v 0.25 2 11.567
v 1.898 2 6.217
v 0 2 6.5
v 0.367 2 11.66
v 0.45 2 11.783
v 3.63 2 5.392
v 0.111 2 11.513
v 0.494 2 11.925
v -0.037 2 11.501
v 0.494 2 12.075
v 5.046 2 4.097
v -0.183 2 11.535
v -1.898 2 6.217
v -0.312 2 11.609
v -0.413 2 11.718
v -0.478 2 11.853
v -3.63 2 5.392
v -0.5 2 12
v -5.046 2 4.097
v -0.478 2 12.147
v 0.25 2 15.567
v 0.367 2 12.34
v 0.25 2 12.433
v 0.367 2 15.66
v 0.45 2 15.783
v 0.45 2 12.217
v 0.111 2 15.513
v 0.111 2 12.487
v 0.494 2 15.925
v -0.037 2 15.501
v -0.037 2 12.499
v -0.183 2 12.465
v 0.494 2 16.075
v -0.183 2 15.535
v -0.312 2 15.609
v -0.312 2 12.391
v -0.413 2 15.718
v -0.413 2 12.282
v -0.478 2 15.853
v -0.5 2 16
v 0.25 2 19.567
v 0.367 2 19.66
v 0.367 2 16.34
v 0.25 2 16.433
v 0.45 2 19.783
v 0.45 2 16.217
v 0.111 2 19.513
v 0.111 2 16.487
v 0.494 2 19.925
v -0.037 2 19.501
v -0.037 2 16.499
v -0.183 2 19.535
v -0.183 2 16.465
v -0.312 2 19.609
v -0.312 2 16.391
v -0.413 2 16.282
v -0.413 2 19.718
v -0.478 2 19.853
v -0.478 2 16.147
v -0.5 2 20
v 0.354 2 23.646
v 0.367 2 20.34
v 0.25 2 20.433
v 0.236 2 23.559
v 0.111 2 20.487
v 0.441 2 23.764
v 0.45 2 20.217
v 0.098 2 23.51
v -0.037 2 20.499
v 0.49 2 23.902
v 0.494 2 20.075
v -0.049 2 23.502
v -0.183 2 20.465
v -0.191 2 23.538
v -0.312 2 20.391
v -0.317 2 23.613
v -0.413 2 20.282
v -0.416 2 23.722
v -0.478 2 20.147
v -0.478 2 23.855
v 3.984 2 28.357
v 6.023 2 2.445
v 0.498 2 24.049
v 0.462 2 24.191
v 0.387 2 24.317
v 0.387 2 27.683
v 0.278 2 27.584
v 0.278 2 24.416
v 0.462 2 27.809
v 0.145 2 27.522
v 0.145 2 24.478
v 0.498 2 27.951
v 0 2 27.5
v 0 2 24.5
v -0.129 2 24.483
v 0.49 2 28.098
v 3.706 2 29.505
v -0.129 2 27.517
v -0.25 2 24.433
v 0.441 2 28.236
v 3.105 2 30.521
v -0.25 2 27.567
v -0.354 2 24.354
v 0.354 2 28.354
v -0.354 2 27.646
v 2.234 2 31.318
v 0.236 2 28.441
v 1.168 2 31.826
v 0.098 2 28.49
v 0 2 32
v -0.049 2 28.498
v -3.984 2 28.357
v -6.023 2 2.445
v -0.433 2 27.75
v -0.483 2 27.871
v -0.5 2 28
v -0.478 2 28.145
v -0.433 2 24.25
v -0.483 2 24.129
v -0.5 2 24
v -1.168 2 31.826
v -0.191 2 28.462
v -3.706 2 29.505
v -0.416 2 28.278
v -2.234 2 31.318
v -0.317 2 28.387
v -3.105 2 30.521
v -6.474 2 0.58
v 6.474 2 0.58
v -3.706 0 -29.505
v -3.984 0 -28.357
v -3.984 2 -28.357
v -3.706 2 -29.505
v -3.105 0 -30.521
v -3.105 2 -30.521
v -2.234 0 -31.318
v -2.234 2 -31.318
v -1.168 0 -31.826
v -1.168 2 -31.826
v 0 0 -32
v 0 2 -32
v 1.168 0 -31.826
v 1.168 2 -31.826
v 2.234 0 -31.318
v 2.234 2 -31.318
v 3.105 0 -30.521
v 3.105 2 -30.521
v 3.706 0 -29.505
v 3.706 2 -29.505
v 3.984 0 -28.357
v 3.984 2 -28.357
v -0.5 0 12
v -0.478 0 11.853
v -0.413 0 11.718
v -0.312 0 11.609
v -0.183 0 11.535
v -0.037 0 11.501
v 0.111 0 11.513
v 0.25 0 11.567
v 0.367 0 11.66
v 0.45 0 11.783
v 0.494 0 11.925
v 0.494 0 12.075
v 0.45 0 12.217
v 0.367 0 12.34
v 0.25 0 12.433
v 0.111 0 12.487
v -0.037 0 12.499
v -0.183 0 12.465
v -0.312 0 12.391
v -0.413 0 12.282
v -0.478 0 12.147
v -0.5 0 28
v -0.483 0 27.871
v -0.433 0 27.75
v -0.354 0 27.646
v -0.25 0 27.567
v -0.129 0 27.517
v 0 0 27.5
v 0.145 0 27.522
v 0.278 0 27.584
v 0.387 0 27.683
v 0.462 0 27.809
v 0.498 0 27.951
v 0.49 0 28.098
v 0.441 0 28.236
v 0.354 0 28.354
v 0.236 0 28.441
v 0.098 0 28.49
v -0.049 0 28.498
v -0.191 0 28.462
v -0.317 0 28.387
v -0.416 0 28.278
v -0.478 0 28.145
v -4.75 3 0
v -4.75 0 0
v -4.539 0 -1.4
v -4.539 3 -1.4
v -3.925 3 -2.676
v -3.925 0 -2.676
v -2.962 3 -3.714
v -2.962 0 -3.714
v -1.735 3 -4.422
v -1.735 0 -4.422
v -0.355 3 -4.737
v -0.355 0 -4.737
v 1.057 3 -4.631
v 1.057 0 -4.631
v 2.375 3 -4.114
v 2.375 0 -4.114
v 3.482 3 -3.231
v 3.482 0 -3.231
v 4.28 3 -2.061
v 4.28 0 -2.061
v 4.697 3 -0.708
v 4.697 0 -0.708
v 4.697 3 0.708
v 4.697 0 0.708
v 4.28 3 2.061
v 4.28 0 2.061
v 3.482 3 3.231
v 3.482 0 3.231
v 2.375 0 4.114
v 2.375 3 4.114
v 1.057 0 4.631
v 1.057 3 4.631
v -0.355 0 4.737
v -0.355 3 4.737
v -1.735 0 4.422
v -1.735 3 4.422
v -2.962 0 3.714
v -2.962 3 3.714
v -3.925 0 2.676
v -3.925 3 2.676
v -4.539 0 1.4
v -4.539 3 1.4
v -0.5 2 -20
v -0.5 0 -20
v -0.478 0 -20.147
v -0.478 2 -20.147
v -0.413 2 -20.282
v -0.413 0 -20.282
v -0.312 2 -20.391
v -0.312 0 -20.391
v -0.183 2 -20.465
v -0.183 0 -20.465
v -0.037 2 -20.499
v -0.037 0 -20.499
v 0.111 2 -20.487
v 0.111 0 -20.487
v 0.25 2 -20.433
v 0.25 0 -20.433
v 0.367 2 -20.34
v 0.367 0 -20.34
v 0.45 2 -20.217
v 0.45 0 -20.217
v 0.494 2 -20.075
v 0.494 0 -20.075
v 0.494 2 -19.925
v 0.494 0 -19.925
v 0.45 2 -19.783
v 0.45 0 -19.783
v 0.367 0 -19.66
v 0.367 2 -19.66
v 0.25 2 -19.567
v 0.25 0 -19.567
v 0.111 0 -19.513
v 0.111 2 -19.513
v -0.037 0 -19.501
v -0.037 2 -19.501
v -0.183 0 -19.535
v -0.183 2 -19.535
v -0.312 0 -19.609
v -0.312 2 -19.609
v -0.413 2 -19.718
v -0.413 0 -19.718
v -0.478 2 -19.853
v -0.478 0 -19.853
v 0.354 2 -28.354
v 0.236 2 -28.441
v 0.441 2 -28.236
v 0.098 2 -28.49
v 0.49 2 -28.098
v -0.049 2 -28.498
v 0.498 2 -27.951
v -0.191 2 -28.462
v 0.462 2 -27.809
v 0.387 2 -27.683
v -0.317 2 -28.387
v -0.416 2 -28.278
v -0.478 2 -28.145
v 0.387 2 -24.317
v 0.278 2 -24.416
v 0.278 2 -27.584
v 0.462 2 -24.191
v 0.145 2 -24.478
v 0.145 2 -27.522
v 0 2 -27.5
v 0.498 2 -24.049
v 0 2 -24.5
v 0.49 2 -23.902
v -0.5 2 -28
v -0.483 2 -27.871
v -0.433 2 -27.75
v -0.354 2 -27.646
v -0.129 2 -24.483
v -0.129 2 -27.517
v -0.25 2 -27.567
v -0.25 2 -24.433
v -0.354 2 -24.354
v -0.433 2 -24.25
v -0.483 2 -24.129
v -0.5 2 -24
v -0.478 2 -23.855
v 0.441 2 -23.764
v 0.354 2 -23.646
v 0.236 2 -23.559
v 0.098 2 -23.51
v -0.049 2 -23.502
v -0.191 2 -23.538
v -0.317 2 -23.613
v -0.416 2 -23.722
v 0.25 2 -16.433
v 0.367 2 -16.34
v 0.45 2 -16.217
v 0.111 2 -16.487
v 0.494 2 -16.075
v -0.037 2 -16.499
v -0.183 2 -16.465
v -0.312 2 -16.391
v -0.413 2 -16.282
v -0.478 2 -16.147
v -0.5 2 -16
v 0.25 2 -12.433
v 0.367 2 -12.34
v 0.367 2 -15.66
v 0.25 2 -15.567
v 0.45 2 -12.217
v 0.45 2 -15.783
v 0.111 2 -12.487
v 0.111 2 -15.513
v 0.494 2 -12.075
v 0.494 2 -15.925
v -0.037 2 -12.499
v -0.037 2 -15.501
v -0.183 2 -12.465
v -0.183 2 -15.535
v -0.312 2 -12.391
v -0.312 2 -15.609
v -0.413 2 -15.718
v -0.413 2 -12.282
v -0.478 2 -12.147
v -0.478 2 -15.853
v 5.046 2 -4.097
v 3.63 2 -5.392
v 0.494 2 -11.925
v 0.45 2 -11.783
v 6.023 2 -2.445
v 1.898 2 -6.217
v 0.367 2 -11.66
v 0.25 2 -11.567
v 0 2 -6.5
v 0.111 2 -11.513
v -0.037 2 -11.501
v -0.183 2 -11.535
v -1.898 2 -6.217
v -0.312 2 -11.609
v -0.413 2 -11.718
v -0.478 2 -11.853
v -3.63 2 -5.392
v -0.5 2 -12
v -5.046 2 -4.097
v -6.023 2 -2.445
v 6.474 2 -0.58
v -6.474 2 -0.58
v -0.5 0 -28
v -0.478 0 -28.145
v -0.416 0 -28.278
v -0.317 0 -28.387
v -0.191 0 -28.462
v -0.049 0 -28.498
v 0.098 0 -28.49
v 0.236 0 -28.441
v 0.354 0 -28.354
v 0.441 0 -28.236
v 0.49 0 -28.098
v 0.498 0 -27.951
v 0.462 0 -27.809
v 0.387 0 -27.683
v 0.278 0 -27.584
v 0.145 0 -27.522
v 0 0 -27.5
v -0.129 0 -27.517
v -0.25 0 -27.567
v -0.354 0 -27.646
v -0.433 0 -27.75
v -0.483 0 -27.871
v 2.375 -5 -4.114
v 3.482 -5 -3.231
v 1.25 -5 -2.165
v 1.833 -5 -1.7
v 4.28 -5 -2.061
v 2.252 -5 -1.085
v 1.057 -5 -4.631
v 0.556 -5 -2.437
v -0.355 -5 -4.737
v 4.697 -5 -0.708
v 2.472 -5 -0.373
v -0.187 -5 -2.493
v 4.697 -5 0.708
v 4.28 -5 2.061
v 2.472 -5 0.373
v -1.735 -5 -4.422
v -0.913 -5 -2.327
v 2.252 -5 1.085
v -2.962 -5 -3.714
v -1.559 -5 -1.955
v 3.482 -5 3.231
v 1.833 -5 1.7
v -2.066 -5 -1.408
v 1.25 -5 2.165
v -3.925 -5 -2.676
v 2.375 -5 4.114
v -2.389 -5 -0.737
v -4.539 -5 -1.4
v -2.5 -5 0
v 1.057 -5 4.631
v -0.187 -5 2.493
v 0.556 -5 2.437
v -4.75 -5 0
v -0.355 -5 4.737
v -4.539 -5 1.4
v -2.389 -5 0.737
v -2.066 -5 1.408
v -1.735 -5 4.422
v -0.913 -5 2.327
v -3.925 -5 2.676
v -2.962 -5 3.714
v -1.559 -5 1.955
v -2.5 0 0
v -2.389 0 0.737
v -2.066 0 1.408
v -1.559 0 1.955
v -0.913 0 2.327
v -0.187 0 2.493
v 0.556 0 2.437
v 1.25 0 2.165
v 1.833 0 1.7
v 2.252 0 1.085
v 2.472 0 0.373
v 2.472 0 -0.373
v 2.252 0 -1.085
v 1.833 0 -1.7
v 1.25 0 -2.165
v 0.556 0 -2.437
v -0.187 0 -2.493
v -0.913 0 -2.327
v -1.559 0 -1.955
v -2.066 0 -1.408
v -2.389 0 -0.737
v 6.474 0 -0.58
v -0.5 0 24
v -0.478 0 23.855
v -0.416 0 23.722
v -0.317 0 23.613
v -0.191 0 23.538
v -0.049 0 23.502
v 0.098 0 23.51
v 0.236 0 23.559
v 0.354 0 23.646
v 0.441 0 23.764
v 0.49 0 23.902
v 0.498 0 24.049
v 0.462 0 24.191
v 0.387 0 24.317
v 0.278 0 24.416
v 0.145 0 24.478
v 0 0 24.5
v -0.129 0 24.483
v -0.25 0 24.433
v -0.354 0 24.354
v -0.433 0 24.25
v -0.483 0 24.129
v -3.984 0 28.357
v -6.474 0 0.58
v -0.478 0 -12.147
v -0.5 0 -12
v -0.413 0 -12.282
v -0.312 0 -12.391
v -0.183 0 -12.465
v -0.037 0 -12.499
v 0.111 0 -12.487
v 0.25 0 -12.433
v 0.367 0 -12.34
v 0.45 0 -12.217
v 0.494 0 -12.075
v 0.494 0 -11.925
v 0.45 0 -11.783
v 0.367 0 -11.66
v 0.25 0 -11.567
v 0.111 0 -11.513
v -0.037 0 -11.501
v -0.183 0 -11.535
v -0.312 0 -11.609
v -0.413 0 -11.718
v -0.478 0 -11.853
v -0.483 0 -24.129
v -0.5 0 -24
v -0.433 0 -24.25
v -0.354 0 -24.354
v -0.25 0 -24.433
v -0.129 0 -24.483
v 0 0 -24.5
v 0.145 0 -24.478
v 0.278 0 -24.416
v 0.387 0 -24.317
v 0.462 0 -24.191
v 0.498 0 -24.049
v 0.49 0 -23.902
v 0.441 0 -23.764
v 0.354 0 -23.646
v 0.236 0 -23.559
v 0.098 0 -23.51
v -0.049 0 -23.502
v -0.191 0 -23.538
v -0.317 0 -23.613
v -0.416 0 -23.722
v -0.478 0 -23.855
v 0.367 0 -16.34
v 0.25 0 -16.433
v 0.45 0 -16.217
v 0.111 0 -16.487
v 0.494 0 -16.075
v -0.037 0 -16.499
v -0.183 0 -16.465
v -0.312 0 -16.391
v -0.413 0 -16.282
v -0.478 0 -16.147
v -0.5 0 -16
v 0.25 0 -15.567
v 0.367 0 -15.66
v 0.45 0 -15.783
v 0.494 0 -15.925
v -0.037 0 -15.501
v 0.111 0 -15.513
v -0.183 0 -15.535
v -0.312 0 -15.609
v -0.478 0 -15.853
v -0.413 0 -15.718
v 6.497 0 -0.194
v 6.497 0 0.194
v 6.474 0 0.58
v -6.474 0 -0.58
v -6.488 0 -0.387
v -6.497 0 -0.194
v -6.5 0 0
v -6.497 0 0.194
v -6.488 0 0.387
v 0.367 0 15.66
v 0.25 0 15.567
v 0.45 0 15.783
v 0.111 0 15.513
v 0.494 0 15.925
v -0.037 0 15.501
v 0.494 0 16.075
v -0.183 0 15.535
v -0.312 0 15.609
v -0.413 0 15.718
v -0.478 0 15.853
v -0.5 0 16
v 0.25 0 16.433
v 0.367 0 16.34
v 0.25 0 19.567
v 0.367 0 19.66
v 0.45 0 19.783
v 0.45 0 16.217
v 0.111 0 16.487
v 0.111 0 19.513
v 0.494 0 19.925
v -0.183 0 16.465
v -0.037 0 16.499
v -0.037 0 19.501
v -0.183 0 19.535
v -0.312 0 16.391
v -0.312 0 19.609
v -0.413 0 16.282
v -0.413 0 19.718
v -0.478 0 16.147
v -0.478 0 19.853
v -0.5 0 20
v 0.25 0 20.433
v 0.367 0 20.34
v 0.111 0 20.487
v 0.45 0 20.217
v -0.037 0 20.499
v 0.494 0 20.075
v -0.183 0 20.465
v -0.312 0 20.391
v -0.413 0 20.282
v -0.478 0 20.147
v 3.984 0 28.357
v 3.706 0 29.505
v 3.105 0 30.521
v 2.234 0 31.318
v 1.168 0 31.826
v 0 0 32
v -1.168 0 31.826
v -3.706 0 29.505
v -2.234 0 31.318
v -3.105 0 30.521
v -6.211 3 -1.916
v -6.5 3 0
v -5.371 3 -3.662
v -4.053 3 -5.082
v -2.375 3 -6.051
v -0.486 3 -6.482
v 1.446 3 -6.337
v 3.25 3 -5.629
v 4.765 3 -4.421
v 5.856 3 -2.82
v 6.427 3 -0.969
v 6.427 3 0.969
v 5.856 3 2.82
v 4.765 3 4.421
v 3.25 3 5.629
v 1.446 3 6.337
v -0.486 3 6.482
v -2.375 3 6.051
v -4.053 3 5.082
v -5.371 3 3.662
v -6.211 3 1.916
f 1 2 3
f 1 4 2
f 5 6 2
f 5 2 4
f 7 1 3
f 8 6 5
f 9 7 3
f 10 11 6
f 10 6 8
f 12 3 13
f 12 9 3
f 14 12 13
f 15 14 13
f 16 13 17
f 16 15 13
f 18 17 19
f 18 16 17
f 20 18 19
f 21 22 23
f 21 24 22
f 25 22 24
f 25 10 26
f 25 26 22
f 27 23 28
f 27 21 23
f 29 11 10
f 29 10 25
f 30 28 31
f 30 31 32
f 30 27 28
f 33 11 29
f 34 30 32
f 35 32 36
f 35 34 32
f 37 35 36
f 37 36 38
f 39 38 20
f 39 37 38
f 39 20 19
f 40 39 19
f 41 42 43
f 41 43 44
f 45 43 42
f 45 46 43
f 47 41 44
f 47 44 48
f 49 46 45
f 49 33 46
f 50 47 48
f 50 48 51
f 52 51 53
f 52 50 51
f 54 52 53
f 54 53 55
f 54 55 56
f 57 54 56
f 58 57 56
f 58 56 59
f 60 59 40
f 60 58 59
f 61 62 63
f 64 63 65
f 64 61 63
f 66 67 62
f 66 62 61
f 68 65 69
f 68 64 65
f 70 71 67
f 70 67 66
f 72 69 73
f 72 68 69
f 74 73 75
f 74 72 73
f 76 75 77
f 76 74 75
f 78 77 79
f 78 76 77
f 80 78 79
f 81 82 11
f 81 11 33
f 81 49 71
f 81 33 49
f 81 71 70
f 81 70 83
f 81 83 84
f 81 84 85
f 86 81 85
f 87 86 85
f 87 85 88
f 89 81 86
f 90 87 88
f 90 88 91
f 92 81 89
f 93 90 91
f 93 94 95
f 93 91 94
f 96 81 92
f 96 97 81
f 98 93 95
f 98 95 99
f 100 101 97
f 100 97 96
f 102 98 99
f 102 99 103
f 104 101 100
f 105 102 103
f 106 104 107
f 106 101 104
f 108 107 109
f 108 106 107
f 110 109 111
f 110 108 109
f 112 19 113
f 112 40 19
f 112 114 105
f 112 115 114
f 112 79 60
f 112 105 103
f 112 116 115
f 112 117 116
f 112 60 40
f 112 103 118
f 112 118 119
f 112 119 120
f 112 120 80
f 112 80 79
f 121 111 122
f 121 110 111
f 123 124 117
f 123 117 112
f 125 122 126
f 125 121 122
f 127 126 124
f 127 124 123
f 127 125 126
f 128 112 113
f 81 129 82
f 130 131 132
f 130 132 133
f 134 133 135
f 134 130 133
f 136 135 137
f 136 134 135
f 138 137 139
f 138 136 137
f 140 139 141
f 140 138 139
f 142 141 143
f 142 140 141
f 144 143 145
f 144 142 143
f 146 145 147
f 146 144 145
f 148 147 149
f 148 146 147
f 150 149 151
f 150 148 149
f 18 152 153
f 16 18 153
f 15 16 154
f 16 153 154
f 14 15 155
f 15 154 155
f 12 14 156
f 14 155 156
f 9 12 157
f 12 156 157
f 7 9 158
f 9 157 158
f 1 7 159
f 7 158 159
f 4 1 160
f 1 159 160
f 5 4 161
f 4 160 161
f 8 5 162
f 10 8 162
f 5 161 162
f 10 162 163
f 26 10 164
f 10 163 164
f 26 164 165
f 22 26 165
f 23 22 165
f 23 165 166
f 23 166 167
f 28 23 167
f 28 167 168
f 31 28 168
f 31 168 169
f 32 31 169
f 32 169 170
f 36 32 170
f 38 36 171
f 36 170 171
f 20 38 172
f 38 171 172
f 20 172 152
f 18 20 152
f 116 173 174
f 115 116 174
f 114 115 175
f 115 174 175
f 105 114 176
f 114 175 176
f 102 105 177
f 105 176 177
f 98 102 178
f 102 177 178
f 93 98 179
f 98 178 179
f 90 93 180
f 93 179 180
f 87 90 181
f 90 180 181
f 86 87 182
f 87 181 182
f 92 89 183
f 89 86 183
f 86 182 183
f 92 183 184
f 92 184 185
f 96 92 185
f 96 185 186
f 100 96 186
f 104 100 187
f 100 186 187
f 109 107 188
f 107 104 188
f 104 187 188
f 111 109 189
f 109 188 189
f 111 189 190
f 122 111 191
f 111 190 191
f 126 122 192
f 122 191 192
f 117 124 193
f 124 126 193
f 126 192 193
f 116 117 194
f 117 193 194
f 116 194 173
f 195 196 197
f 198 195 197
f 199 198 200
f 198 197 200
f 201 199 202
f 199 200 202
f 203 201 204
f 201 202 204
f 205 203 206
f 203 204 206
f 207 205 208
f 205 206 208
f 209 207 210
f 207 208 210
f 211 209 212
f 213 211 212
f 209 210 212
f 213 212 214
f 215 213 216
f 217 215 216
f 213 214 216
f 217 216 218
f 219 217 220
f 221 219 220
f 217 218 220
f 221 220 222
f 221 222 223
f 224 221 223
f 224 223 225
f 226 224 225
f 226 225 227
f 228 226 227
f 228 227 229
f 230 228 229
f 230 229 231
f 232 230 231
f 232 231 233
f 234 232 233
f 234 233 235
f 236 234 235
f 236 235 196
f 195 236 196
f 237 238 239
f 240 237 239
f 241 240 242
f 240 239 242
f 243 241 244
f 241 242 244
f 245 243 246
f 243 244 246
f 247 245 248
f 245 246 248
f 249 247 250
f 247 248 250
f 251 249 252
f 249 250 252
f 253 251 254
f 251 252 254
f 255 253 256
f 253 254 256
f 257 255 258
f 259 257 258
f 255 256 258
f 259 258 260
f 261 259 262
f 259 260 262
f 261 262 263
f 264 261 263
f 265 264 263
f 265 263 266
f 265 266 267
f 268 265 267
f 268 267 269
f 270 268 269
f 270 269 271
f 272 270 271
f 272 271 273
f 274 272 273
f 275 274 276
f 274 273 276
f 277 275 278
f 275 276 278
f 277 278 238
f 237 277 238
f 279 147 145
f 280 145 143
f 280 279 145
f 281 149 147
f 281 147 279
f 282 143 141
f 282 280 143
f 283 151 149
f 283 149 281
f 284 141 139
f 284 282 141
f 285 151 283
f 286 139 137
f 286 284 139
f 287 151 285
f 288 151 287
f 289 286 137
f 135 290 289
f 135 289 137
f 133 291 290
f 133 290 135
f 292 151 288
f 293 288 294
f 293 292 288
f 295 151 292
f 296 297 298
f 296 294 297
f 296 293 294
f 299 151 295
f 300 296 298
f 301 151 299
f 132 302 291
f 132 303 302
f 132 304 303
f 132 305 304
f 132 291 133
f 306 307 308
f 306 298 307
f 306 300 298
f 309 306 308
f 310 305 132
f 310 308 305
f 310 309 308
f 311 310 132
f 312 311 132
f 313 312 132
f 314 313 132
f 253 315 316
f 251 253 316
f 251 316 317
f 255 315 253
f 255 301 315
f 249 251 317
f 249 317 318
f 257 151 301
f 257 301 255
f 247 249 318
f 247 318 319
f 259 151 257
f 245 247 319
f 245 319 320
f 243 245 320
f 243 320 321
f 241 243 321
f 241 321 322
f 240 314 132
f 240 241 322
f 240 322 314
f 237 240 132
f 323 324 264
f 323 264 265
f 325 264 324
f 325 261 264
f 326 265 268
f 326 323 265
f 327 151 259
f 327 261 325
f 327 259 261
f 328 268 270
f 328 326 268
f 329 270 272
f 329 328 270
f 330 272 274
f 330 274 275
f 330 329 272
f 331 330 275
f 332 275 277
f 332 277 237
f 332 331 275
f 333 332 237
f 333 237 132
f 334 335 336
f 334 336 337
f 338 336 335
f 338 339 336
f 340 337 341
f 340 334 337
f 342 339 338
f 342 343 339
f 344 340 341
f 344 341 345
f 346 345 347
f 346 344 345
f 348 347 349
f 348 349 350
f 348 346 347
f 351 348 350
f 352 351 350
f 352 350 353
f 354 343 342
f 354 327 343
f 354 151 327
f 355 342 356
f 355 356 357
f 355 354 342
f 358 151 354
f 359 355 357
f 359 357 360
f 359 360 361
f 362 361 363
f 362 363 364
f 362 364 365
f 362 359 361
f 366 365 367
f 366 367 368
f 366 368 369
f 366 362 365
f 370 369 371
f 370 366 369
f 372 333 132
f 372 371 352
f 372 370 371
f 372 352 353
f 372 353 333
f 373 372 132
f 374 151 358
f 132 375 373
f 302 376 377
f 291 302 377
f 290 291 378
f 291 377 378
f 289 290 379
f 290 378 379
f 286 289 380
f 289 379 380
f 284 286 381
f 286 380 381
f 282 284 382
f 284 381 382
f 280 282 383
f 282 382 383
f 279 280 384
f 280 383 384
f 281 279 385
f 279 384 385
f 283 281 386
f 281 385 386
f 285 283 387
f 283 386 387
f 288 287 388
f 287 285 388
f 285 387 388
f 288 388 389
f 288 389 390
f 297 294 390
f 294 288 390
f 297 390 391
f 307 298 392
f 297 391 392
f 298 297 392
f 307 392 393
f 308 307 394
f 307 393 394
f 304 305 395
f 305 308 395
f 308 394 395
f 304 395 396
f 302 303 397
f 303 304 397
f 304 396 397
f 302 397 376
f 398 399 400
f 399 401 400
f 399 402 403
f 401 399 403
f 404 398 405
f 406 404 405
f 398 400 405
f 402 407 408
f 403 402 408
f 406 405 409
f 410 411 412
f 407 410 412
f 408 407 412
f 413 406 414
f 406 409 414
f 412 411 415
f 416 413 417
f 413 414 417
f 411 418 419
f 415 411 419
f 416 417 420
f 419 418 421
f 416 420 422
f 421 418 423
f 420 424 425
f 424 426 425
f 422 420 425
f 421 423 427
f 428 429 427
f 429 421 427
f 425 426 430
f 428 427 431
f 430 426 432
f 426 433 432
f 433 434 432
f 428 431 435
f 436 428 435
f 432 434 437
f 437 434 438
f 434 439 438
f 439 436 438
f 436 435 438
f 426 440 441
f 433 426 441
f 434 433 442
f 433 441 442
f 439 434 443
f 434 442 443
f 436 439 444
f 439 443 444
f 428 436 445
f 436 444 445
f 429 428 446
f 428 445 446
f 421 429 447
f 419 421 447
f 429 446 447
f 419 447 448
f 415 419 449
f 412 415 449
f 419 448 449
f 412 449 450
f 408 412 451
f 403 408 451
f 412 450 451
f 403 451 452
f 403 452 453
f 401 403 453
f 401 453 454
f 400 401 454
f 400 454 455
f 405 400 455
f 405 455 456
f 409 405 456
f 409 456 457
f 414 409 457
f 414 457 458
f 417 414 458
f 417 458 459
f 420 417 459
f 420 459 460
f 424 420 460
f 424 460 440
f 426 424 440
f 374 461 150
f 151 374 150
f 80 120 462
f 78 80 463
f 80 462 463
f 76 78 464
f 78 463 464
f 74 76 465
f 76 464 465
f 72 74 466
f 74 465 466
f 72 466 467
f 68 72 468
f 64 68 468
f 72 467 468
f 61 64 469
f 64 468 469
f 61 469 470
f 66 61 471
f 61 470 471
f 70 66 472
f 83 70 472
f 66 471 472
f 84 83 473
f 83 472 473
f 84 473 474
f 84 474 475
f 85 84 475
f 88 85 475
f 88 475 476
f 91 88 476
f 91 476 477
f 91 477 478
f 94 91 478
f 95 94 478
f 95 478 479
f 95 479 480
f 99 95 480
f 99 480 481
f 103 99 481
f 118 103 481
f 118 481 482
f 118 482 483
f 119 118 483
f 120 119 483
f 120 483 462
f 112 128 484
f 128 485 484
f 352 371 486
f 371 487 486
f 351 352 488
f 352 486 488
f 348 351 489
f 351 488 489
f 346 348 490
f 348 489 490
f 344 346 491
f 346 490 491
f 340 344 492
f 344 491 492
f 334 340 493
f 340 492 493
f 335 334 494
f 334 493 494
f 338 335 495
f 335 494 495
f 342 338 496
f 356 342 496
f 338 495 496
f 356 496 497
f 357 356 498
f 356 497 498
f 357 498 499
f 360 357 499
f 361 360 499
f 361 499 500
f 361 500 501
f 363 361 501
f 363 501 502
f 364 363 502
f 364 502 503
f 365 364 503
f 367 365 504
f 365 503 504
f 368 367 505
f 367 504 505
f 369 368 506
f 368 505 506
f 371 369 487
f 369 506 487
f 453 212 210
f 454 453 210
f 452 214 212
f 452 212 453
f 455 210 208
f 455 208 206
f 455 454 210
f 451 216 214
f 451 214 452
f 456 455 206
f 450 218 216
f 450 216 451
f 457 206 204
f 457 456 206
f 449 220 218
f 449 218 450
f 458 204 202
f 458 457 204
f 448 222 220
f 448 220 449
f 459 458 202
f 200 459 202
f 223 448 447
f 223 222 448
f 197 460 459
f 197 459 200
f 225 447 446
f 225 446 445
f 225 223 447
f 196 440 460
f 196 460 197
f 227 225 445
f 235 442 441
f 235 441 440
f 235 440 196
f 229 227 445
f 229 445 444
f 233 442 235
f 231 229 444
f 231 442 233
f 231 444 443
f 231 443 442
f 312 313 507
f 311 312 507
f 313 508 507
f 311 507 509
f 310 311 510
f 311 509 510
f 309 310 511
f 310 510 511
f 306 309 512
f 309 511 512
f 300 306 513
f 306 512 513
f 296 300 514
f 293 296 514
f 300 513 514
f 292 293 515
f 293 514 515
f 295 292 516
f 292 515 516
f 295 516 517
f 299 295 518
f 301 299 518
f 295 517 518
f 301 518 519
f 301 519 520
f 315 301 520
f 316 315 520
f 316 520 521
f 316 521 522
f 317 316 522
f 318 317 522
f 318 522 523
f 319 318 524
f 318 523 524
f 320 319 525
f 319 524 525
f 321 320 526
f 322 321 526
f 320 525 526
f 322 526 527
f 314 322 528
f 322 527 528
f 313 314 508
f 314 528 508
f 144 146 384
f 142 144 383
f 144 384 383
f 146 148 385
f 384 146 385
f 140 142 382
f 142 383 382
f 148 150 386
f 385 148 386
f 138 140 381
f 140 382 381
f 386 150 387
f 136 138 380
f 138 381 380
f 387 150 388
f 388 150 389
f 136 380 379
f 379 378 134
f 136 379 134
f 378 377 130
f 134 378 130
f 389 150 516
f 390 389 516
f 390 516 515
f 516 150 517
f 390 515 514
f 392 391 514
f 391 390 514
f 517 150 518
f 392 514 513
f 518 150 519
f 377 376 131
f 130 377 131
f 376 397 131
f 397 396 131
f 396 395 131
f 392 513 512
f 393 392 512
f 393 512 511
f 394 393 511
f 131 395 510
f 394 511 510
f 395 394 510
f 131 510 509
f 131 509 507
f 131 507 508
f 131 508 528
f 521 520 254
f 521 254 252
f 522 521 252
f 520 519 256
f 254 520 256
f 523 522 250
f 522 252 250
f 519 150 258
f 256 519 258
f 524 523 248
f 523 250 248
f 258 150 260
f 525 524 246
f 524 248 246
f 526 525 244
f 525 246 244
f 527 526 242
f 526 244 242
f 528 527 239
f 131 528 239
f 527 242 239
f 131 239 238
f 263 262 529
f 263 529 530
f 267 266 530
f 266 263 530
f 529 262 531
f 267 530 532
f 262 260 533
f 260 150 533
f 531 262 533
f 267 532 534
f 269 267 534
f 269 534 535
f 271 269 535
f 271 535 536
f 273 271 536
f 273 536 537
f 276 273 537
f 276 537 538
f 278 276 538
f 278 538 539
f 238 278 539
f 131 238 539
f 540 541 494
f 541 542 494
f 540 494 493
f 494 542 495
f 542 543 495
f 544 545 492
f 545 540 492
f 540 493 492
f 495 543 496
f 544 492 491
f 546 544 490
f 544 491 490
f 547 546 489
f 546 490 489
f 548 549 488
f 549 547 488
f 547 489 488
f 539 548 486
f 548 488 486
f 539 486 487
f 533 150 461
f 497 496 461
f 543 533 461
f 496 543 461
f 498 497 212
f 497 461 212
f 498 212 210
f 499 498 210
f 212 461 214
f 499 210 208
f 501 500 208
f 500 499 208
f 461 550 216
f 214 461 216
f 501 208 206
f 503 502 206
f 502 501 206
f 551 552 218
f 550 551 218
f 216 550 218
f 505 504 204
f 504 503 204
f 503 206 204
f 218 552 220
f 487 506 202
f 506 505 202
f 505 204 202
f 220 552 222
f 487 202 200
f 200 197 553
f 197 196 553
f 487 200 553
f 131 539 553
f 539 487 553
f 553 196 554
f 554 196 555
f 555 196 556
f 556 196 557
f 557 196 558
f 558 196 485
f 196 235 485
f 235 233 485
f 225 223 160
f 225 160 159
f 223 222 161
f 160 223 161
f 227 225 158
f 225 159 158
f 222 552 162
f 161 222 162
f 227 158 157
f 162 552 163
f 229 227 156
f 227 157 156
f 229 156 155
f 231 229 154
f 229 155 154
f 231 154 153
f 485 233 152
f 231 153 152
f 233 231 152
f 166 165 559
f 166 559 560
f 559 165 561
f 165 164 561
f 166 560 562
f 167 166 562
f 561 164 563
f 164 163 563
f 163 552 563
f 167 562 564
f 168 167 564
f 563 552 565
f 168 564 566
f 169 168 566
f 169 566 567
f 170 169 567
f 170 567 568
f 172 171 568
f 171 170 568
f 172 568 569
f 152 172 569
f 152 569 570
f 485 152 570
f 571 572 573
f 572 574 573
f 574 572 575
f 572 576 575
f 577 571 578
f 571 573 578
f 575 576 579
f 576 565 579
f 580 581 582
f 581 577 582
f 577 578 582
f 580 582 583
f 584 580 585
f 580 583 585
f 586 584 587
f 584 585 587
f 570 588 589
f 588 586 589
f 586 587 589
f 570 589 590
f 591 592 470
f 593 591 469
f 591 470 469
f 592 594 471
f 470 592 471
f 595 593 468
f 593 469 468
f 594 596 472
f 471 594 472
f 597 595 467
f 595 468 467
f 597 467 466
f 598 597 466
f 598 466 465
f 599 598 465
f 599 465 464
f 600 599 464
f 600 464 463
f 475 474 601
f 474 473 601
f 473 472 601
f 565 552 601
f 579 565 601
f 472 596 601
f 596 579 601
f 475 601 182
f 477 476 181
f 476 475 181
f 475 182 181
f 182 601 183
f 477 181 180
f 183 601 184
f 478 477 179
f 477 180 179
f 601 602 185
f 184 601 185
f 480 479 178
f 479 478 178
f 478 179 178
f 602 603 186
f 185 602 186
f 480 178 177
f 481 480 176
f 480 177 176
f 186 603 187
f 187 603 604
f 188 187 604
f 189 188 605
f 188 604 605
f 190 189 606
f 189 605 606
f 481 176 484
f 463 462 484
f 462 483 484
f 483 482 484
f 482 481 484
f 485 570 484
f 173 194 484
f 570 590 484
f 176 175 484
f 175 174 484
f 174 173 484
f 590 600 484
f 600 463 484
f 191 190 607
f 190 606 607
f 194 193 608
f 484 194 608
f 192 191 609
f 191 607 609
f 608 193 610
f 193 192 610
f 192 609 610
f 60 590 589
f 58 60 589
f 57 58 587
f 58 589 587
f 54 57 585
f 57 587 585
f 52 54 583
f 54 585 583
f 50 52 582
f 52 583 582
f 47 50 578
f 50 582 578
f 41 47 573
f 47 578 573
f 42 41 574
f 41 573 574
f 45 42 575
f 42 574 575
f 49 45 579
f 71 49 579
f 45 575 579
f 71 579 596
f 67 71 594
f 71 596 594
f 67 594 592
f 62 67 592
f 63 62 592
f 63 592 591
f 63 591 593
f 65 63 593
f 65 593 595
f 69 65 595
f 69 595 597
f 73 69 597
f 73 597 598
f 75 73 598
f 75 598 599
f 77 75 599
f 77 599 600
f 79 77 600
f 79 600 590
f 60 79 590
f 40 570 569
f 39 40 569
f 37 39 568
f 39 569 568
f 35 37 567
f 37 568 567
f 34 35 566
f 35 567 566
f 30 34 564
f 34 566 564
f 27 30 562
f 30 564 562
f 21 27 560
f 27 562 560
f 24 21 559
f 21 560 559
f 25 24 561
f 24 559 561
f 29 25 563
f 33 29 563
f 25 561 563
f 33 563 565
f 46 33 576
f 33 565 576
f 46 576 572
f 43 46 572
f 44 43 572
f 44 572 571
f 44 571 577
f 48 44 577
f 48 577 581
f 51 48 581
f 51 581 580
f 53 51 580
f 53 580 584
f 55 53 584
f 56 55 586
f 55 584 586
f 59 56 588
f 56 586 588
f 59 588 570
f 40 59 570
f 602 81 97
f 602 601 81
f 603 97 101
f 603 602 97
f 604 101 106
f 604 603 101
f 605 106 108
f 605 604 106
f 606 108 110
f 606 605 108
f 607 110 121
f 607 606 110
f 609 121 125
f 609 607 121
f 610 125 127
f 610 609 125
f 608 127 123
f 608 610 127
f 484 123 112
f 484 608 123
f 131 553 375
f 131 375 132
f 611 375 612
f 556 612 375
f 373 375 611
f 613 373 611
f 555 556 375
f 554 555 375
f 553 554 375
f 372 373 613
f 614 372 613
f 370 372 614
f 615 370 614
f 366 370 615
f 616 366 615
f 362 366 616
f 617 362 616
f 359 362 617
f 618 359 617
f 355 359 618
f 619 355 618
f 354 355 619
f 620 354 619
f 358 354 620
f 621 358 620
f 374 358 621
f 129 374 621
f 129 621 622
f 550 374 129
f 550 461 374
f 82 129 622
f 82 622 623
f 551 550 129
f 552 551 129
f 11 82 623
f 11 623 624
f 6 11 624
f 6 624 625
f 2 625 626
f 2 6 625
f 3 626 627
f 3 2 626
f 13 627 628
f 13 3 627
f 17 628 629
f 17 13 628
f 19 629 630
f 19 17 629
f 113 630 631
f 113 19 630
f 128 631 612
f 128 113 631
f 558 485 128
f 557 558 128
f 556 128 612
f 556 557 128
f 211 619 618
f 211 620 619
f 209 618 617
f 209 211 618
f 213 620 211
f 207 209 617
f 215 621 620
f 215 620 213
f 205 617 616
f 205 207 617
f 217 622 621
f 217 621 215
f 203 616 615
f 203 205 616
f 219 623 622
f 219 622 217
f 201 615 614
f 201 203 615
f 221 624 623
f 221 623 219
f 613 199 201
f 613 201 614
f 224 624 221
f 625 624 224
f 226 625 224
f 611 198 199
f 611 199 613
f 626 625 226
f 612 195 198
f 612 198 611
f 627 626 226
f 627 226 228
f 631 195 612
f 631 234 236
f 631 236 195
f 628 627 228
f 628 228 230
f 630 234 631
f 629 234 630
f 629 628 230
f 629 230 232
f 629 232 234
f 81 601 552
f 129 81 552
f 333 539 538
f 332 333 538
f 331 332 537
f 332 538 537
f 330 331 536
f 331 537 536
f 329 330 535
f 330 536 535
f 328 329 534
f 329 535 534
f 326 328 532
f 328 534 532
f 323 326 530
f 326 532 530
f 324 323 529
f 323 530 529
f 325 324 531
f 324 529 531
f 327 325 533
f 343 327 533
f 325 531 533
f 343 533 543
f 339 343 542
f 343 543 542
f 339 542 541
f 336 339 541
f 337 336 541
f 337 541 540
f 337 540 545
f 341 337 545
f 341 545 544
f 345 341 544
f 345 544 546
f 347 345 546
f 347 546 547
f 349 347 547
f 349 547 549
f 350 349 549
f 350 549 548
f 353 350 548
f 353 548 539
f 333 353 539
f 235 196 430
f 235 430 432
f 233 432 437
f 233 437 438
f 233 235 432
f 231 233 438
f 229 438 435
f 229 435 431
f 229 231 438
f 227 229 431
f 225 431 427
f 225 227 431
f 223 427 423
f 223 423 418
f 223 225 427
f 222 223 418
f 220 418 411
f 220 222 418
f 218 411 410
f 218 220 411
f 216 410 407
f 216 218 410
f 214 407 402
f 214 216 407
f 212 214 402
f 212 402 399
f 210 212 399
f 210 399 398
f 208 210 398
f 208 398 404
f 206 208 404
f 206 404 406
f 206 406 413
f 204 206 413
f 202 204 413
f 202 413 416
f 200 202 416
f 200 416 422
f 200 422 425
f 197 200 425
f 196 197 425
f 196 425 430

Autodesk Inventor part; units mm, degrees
ref_plane "YZ Plane" through (0, 0, 0) normal (1, 0, 0) x (0, 1, 0)
ref_plane "XZ Plane" through (0, 0, 0) normal (0, 1, 0) x (-1, 0, 0)
ref_plane "XY Plane" through (0, 0, 0) normal (0, 0, 1) x (1, 0, 0)
sketch "スケッチ1" plane through (0, 0, 0) normal (0, 1, 0) x (-1, 0, 0)
  circle A0 centre (0, 0) radius 2.5
  circle A1 centre (0, 0) radius 4.75
  line L0 (0, 0) -> (0, -28)
  line L1 (0, 0) -> (0, 28)
  circle A2 centre (0, 0) radius 6.5
  circle A3 centre (0, 28) radius 4
  line L2 (6.5, 0) -> (-6.5, 0)
  circle A4 centre (0, -28) radius 4
  line L3 (6.474, 0.5804) -> (3.984, 28.3571)
  line L4 (-3.984, 28.3571) -> (-6.474, 0.5804)
  line L5 (-6.474, -0.5804) -> (-3.984, -28.3571)
  line L6 (6.474, -0.5804) -> (3.984, -28.3571)
  circle A5 centre (0, -28) radius 0.5
  circle A6 centre (0, -24) radius 0.5
  circle A7 centre (0, -20) radius 0.5
  circle A8 centre (0, -16) radius 0.5
  circle A9 centre (0, -12) radius 0.5
  circle A10 centre (0, 28) radius 0.5
  circle A11 centre (0, 24) radius 0.5
  circle A12 centre (0, 20) radius 0.5
  circle A13 centre (0, 16) radius 0.5
  circle A14 centre (0, 12) radius 0.5
  dimension "d0" = 5
  dimension "d1" = 9.5
  dimension "d2" = 28
  dimension "d3" = 28
  dimension "d4" = 13
  dimension "d5" = 8
  dimension "d6" = 0
  dimension "d7" = 0
  dimension "d8" = 1
  dimension "d9" = 1
  dimension "d10" = 4
  dimension "d11" = 1
  dimension "d12" = 1
  dimension "d13" = 1
  dimension "d14" = 4
  dimension "d15" = 4
  dimension "d16" = 4
extrude "押し出し1" add sketch "スケッチ1" along normal blind 2 contours A2 L4 A3 A11 L1 A12 A13 A14 | L1 A14 A13 A12 A11 A3 L3 A2 | A2 L6 A4 A6 L0 A7 A8 A9 | L0 A9 A8 A7 A6 A4 L5 A2 | A3 A11 | A4 A6
extrude "押し出し2" add sketch "スケッチ1" along normal blind 3 contours L2 A2 L0 A1 | A1 L1 A2 L2 | A1 L2 A2 L1 | L0 A2 L2 A1
extrude "押し出し3" add sketch "スケッチ1" against normal blind 5 contours L2 A1 L0 A0 | A0 L1 A1 L2 | A0 L2 A1 L1 | L0 A1 L2 A0
equation "\"d14\" = d10"
equation "\"d15\" = d14"
equation "\"d16\" = d15"
properties part number "ServoMotor_Hone1"
